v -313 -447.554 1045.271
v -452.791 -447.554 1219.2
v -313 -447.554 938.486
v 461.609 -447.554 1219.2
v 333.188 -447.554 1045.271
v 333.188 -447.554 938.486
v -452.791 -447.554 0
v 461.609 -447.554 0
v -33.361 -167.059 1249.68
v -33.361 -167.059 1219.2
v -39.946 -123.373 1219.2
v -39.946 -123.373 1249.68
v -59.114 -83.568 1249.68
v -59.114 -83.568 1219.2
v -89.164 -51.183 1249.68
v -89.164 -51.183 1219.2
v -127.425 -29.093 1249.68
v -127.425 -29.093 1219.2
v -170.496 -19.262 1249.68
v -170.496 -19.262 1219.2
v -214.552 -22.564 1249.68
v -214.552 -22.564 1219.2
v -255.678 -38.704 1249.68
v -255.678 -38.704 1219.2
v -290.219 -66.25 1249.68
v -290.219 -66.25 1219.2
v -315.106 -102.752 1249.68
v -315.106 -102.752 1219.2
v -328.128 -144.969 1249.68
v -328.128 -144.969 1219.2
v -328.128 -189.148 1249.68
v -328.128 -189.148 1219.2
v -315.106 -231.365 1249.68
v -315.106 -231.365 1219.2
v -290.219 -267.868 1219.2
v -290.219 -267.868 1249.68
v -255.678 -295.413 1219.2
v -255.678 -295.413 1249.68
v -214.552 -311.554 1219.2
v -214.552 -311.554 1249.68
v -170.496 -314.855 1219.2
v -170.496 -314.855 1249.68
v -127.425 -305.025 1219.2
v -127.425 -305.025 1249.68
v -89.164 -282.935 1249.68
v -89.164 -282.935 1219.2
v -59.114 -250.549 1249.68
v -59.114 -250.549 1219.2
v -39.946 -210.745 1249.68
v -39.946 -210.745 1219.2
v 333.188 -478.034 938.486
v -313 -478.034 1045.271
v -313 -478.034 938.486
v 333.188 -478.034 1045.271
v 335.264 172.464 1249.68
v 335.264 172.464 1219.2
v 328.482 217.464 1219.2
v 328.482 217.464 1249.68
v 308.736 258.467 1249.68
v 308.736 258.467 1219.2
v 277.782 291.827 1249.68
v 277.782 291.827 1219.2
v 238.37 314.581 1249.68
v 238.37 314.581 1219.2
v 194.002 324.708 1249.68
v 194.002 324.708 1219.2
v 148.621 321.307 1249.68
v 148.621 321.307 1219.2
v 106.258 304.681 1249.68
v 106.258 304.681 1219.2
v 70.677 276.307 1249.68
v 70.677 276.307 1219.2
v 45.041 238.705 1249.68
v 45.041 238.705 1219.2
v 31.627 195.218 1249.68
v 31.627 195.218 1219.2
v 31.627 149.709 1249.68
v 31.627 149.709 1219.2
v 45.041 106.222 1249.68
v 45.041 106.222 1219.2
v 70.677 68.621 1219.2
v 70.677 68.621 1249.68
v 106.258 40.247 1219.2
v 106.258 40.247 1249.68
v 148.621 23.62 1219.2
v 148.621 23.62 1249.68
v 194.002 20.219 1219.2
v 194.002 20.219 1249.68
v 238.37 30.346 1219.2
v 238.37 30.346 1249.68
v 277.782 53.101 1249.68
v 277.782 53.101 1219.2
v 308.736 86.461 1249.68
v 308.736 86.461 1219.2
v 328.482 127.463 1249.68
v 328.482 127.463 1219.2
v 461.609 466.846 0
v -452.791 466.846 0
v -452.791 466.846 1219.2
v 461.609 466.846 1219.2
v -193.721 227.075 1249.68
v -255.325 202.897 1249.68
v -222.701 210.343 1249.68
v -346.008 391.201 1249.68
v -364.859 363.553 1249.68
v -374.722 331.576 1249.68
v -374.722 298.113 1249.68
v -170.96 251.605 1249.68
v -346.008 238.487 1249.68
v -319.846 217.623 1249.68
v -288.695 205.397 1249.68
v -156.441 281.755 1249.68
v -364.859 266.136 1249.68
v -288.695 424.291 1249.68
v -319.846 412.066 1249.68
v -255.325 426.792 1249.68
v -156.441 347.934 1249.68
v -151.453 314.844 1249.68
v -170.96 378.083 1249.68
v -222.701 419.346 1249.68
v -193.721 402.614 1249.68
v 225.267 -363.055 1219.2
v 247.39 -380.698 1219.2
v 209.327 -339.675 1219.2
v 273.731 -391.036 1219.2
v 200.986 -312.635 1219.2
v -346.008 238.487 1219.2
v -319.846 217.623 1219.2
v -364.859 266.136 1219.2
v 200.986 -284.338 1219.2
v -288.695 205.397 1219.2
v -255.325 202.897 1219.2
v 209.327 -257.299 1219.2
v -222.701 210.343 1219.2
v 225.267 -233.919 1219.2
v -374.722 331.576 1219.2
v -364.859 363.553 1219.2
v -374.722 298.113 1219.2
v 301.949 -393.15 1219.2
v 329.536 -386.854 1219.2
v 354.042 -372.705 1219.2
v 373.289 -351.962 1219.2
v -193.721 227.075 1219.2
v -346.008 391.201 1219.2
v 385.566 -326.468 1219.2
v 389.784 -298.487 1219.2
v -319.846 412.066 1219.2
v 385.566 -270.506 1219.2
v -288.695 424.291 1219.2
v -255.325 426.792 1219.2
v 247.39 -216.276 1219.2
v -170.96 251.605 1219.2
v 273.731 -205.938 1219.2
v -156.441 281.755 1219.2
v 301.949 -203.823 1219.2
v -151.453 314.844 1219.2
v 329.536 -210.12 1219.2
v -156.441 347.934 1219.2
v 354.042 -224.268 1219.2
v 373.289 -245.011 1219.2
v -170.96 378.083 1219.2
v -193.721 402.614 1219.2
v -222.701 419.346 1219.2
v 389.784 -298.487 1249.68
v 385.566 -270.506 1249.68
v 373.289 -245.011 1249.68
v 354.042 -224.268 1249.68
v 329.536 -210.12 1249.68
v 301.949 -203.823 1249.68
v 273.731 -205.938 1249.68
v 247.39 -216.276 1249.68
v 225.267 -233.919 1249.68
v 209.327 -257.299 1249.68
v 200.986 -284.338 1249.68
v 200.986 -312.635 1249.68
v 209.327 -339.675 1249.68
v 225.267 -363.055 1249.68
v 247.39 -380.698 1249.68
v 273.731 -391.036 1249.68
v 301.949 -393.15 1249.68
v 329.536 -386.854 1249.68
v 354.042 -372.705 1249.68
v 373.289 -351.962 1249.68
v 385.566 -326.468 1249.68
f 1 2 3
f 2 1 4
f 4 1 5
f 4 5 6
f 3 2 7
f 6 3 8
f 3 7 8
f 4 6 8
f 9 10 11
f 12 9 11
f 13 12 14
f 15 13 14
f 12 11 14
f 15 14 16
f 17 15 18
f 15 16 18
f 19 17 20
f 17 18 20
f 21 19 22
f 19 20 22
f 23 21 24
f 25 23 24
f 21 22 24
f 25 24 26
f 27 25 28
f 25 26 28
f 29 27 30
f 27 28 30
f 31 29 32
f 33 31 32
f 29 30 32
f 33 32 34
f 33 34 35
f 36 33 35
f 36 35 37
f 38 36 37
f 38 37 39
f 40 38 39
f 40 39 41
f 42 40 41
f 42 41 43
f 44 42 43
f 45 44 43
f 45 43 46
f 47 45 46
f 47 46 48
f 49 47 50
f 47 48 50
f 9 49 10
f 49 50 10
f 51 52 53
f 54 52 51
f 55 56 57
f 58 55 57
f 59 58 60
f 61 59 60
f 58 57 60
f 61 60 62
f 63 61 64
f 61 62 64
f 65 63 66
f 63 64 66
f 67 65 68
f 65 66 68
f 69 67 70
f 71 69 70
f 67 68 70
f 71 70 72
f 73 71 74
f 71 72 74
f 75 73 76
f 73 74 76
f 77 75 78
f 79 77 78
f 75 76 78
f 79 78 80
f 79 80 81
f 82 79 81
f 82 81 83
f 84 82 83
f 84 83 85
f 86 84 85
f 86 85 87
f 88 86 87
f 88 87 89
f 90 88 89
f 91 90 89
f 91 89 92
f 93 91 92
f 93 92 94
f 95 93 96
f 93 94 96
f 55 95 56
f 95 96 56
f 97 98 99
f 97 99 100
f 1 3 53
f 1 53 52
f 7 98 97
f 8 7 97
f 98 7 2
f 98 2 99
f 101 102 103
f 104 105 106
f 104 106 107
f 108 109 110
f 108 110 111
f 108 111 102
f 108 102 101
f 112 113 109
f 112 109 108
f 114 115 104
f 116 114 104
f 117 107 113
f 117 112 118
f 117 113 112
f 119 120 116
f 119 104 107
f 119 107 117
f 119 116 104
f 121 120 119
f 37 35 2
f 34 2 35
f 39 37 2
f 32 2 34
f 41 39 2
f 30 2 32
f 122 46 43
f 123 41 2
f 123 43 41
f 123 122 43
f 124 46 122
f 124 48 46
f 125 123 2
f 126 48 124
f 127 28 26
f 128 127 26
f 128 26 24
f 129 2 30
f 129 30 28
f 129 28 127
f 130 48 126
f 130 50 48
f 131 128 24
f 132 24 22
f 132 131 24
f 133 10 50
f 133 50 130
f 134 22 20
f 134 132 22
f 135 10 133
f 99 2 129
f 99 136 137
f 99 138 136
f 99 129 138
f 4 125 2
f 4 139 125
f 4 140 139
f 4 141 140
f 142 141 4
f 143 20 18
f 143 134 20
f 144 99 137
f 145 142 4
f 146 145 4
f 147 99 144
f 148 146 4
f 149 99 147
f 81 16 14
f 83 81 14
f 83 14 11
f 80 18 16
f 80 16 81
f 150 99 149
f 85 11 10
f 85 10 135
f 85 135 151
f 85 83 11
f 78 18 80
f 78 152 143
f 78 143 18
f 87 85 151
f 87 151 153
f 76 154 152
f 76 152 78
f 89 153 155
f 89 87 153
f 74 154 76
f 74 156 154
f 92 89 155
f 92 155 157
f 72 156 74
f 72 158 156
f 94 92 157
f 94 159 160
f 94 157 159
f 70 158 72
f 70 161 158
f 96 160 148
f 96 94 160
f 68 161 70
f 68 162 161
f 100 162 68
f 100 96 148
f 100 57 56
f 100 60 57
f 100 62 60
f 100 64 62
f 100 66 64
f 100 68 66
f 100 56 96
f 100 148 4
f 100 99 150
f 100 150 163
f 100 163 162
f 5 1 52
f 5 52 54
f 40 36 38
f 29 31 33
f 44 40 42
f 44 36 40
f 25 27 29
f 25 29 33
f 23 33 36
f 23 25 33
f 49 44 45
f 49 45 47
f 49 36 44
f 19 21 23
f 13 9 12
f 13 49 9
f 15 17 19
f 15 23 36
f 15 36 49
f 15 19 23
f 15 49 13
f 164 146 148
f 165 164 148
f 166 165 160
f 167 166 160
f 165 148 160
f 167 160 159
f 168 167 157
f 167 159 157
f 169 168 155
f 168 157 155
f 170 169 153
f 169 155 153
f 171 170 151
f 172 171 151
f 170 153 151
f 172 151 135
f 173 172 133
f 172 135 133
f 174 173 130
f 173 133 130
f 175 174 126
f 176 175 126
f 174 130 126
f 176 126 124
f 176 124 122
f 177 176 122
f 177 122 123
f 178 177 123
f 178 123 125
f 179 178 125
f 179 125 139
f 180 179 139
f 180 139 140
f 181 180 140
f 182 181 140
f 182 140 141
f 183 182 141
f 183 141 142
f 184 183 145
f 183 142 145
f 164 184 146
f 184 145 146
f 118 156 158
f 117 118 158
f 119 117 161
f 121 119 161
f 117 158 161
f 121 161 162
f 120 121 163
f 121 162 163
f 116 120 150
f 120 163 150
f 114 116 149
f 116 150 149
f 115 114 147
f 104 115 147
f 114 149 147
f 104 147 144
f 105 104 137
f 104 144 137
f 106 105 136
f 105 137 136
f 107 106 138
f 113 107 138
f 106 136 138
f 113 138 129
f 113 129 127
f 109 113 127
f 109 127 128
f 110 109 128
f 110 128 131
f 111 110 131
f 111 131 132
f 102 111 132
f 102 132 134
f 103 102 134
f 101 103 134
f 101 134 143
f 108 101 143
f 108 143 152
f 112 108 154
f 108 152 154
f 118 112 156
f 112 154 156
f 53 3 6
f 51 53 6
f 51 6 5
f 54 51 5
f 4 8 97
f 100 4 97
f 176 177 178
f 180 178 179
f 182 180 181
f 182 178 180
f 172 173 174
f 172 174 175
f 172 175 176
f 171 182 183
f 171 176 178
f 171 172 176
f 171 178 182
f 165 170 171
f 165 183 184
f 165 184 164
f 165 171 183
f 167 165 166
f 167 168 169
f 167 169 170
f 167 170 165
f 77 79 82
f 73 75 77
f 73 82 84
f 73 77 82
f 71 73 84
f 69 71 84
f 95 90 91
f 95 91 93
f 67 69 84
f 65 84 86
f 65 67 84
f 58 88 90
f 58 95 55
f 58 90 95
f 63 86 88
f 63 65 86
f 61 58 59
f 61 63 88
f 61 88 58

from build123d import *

# Parameters (mm, degrees)
F0_W     = 914.4
F0_H     = 914.4
F1_DEPTH = 1219.2
F2_R     = 112.2615
F2_R_2   = 94.92904
F2_R_3   = 152.671278
F2_R_4   = 148.211115
F3_DEPTH = 30.48
F4_W     = 646.188111
F4_H     = 106.785357
F5_DEPTH = 30.48


with BuildPart() as f1:
    # F0 (on Top) → F1 (new body)
    with BuildSketch(Plane.XY):
        with Locations((4.408748, 9.645843)):
            Rectangle(F0_W, F0_H)
    extrude(amount=F1_DEPTH)

    # F2 (on face) → F3 (join)
    with BuildSketch(Plane.XY.offset(1219.2)):
        with Locations((-263.714761, 314.844251)):
            Circle(F2_R)
        with Locations((294.854611, -298.486859)):
            Circle(F2_R_2)
        with Locations((182.593152, 172.46379)):
            Circle(F2_R_3)
        with Locations((-181.572214, -167.058766)):
            Circle(F2_R_4)
    extrude(amount=F3_DEPTH)

    # F4 (on face) → F5 (join)
    with BuildSketch(Plane.XZ.offset(447.554157)):
        with Locations((10.093763, 991.878598)):
            Rectangle(F4_W, F4_H)
    extrude(amount=F5_DEPTH)


solid = f1.part
